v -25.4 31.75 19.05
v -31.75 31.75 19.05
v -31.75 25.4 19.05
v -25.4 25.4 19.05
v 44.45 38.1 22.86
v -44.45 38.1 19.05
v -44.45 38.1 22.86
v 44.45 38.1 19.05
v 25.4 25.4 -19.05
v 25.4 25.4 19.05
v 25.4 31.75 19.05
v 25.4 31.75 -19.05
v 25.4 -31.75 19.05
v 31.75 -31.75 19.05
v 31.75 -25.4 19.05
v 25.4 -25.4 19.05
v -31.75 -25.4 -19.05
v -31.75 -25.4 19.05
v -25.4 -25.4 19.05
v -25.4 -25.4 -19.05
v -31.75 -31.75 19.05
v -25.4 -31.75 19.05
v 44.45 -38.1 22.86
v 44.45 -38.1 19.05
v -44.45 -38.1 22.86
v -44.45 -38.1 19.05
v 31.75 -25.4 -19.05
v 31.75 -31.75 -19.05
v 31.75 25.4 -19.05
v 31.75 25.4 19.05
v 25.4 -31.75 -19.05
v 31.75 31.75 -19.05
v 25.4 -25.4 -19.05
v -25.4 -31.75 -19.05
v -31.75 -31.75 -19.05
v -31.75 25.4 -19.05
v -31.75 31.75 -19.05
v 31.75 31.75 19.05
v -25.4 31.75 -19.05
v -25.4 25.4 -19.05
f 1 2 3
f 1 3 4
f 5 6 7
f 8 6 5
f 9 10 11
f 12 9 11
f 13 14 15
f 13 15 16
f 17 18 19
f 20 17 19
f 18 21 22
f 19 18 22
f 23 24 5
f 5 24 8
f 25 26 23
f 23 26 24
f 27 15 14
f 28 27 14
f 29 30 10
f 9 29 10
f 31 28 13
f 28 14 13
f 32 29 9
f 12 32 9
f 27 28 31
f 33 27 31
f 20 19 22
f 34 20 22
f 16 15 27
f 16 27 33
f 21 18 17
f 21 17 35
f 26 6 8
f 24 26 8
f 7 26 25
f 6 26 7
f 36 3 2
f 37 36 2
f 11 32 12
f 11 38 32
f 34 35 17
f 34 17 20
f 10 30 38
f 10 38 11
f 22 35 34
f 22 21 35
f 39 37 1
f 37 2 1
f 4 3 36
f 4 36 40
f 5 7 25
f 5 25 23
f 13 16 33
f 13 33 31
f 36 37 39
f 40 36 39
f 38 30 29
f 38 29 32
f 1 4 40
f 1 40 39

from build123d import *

# Parameters (mm, degrees)
F0_W     = 6.35
F0_H     = 6.35
F1_DEPTH = 19.05
F4_W     = 88.9
F4_H     = 76.2
F4_W_2   = 6.35
F4_H_2   = 6.35
F5_DEPTH = 3.81


with BuildPart() as f1:
    # F0 (on Top) → F1 (new body, symmetric)
    with BuildSketch(Plane.XY):
        with Locations((-28.575, 28.575)):
            Rectangle(F0_W, F0_H)
    extrude(amount=F1_DEPTH, both=True)


with BuildPart() as f2_1:
    # F2: instance of F1
    add(f1.part.mirror(Plane.YZ))


with BuildPart() as f3_1:
    # F3: instance of F1
    add(f1.part.mirror(Plane.XZ))


with BuildPart() as f3_2:
    # F3: instance of F2_1
    add(f2_1.part.mirror(Plane.XZ))


with BuildPart() as f5:
    # F4 (on face) → F5 (new body)
    with BuildSketch(Plane.XY.offset(19.05)):
        Rectangle(F4_W, F4_H)
        with Locations((-28.575, 28.575)):
            Rectangle(F4_W_2, F4_H_2, mode=Mode.SUBTRACT)
        with Locations((-28.575, 28.575)):
            Rectangle(F4_W_2, F4_H_2)
    extrude(amount=F5_DEPTH)


solid = Compound([f1.part, f2_1.part, f3_1.part, f3_2.part, f5.part])
